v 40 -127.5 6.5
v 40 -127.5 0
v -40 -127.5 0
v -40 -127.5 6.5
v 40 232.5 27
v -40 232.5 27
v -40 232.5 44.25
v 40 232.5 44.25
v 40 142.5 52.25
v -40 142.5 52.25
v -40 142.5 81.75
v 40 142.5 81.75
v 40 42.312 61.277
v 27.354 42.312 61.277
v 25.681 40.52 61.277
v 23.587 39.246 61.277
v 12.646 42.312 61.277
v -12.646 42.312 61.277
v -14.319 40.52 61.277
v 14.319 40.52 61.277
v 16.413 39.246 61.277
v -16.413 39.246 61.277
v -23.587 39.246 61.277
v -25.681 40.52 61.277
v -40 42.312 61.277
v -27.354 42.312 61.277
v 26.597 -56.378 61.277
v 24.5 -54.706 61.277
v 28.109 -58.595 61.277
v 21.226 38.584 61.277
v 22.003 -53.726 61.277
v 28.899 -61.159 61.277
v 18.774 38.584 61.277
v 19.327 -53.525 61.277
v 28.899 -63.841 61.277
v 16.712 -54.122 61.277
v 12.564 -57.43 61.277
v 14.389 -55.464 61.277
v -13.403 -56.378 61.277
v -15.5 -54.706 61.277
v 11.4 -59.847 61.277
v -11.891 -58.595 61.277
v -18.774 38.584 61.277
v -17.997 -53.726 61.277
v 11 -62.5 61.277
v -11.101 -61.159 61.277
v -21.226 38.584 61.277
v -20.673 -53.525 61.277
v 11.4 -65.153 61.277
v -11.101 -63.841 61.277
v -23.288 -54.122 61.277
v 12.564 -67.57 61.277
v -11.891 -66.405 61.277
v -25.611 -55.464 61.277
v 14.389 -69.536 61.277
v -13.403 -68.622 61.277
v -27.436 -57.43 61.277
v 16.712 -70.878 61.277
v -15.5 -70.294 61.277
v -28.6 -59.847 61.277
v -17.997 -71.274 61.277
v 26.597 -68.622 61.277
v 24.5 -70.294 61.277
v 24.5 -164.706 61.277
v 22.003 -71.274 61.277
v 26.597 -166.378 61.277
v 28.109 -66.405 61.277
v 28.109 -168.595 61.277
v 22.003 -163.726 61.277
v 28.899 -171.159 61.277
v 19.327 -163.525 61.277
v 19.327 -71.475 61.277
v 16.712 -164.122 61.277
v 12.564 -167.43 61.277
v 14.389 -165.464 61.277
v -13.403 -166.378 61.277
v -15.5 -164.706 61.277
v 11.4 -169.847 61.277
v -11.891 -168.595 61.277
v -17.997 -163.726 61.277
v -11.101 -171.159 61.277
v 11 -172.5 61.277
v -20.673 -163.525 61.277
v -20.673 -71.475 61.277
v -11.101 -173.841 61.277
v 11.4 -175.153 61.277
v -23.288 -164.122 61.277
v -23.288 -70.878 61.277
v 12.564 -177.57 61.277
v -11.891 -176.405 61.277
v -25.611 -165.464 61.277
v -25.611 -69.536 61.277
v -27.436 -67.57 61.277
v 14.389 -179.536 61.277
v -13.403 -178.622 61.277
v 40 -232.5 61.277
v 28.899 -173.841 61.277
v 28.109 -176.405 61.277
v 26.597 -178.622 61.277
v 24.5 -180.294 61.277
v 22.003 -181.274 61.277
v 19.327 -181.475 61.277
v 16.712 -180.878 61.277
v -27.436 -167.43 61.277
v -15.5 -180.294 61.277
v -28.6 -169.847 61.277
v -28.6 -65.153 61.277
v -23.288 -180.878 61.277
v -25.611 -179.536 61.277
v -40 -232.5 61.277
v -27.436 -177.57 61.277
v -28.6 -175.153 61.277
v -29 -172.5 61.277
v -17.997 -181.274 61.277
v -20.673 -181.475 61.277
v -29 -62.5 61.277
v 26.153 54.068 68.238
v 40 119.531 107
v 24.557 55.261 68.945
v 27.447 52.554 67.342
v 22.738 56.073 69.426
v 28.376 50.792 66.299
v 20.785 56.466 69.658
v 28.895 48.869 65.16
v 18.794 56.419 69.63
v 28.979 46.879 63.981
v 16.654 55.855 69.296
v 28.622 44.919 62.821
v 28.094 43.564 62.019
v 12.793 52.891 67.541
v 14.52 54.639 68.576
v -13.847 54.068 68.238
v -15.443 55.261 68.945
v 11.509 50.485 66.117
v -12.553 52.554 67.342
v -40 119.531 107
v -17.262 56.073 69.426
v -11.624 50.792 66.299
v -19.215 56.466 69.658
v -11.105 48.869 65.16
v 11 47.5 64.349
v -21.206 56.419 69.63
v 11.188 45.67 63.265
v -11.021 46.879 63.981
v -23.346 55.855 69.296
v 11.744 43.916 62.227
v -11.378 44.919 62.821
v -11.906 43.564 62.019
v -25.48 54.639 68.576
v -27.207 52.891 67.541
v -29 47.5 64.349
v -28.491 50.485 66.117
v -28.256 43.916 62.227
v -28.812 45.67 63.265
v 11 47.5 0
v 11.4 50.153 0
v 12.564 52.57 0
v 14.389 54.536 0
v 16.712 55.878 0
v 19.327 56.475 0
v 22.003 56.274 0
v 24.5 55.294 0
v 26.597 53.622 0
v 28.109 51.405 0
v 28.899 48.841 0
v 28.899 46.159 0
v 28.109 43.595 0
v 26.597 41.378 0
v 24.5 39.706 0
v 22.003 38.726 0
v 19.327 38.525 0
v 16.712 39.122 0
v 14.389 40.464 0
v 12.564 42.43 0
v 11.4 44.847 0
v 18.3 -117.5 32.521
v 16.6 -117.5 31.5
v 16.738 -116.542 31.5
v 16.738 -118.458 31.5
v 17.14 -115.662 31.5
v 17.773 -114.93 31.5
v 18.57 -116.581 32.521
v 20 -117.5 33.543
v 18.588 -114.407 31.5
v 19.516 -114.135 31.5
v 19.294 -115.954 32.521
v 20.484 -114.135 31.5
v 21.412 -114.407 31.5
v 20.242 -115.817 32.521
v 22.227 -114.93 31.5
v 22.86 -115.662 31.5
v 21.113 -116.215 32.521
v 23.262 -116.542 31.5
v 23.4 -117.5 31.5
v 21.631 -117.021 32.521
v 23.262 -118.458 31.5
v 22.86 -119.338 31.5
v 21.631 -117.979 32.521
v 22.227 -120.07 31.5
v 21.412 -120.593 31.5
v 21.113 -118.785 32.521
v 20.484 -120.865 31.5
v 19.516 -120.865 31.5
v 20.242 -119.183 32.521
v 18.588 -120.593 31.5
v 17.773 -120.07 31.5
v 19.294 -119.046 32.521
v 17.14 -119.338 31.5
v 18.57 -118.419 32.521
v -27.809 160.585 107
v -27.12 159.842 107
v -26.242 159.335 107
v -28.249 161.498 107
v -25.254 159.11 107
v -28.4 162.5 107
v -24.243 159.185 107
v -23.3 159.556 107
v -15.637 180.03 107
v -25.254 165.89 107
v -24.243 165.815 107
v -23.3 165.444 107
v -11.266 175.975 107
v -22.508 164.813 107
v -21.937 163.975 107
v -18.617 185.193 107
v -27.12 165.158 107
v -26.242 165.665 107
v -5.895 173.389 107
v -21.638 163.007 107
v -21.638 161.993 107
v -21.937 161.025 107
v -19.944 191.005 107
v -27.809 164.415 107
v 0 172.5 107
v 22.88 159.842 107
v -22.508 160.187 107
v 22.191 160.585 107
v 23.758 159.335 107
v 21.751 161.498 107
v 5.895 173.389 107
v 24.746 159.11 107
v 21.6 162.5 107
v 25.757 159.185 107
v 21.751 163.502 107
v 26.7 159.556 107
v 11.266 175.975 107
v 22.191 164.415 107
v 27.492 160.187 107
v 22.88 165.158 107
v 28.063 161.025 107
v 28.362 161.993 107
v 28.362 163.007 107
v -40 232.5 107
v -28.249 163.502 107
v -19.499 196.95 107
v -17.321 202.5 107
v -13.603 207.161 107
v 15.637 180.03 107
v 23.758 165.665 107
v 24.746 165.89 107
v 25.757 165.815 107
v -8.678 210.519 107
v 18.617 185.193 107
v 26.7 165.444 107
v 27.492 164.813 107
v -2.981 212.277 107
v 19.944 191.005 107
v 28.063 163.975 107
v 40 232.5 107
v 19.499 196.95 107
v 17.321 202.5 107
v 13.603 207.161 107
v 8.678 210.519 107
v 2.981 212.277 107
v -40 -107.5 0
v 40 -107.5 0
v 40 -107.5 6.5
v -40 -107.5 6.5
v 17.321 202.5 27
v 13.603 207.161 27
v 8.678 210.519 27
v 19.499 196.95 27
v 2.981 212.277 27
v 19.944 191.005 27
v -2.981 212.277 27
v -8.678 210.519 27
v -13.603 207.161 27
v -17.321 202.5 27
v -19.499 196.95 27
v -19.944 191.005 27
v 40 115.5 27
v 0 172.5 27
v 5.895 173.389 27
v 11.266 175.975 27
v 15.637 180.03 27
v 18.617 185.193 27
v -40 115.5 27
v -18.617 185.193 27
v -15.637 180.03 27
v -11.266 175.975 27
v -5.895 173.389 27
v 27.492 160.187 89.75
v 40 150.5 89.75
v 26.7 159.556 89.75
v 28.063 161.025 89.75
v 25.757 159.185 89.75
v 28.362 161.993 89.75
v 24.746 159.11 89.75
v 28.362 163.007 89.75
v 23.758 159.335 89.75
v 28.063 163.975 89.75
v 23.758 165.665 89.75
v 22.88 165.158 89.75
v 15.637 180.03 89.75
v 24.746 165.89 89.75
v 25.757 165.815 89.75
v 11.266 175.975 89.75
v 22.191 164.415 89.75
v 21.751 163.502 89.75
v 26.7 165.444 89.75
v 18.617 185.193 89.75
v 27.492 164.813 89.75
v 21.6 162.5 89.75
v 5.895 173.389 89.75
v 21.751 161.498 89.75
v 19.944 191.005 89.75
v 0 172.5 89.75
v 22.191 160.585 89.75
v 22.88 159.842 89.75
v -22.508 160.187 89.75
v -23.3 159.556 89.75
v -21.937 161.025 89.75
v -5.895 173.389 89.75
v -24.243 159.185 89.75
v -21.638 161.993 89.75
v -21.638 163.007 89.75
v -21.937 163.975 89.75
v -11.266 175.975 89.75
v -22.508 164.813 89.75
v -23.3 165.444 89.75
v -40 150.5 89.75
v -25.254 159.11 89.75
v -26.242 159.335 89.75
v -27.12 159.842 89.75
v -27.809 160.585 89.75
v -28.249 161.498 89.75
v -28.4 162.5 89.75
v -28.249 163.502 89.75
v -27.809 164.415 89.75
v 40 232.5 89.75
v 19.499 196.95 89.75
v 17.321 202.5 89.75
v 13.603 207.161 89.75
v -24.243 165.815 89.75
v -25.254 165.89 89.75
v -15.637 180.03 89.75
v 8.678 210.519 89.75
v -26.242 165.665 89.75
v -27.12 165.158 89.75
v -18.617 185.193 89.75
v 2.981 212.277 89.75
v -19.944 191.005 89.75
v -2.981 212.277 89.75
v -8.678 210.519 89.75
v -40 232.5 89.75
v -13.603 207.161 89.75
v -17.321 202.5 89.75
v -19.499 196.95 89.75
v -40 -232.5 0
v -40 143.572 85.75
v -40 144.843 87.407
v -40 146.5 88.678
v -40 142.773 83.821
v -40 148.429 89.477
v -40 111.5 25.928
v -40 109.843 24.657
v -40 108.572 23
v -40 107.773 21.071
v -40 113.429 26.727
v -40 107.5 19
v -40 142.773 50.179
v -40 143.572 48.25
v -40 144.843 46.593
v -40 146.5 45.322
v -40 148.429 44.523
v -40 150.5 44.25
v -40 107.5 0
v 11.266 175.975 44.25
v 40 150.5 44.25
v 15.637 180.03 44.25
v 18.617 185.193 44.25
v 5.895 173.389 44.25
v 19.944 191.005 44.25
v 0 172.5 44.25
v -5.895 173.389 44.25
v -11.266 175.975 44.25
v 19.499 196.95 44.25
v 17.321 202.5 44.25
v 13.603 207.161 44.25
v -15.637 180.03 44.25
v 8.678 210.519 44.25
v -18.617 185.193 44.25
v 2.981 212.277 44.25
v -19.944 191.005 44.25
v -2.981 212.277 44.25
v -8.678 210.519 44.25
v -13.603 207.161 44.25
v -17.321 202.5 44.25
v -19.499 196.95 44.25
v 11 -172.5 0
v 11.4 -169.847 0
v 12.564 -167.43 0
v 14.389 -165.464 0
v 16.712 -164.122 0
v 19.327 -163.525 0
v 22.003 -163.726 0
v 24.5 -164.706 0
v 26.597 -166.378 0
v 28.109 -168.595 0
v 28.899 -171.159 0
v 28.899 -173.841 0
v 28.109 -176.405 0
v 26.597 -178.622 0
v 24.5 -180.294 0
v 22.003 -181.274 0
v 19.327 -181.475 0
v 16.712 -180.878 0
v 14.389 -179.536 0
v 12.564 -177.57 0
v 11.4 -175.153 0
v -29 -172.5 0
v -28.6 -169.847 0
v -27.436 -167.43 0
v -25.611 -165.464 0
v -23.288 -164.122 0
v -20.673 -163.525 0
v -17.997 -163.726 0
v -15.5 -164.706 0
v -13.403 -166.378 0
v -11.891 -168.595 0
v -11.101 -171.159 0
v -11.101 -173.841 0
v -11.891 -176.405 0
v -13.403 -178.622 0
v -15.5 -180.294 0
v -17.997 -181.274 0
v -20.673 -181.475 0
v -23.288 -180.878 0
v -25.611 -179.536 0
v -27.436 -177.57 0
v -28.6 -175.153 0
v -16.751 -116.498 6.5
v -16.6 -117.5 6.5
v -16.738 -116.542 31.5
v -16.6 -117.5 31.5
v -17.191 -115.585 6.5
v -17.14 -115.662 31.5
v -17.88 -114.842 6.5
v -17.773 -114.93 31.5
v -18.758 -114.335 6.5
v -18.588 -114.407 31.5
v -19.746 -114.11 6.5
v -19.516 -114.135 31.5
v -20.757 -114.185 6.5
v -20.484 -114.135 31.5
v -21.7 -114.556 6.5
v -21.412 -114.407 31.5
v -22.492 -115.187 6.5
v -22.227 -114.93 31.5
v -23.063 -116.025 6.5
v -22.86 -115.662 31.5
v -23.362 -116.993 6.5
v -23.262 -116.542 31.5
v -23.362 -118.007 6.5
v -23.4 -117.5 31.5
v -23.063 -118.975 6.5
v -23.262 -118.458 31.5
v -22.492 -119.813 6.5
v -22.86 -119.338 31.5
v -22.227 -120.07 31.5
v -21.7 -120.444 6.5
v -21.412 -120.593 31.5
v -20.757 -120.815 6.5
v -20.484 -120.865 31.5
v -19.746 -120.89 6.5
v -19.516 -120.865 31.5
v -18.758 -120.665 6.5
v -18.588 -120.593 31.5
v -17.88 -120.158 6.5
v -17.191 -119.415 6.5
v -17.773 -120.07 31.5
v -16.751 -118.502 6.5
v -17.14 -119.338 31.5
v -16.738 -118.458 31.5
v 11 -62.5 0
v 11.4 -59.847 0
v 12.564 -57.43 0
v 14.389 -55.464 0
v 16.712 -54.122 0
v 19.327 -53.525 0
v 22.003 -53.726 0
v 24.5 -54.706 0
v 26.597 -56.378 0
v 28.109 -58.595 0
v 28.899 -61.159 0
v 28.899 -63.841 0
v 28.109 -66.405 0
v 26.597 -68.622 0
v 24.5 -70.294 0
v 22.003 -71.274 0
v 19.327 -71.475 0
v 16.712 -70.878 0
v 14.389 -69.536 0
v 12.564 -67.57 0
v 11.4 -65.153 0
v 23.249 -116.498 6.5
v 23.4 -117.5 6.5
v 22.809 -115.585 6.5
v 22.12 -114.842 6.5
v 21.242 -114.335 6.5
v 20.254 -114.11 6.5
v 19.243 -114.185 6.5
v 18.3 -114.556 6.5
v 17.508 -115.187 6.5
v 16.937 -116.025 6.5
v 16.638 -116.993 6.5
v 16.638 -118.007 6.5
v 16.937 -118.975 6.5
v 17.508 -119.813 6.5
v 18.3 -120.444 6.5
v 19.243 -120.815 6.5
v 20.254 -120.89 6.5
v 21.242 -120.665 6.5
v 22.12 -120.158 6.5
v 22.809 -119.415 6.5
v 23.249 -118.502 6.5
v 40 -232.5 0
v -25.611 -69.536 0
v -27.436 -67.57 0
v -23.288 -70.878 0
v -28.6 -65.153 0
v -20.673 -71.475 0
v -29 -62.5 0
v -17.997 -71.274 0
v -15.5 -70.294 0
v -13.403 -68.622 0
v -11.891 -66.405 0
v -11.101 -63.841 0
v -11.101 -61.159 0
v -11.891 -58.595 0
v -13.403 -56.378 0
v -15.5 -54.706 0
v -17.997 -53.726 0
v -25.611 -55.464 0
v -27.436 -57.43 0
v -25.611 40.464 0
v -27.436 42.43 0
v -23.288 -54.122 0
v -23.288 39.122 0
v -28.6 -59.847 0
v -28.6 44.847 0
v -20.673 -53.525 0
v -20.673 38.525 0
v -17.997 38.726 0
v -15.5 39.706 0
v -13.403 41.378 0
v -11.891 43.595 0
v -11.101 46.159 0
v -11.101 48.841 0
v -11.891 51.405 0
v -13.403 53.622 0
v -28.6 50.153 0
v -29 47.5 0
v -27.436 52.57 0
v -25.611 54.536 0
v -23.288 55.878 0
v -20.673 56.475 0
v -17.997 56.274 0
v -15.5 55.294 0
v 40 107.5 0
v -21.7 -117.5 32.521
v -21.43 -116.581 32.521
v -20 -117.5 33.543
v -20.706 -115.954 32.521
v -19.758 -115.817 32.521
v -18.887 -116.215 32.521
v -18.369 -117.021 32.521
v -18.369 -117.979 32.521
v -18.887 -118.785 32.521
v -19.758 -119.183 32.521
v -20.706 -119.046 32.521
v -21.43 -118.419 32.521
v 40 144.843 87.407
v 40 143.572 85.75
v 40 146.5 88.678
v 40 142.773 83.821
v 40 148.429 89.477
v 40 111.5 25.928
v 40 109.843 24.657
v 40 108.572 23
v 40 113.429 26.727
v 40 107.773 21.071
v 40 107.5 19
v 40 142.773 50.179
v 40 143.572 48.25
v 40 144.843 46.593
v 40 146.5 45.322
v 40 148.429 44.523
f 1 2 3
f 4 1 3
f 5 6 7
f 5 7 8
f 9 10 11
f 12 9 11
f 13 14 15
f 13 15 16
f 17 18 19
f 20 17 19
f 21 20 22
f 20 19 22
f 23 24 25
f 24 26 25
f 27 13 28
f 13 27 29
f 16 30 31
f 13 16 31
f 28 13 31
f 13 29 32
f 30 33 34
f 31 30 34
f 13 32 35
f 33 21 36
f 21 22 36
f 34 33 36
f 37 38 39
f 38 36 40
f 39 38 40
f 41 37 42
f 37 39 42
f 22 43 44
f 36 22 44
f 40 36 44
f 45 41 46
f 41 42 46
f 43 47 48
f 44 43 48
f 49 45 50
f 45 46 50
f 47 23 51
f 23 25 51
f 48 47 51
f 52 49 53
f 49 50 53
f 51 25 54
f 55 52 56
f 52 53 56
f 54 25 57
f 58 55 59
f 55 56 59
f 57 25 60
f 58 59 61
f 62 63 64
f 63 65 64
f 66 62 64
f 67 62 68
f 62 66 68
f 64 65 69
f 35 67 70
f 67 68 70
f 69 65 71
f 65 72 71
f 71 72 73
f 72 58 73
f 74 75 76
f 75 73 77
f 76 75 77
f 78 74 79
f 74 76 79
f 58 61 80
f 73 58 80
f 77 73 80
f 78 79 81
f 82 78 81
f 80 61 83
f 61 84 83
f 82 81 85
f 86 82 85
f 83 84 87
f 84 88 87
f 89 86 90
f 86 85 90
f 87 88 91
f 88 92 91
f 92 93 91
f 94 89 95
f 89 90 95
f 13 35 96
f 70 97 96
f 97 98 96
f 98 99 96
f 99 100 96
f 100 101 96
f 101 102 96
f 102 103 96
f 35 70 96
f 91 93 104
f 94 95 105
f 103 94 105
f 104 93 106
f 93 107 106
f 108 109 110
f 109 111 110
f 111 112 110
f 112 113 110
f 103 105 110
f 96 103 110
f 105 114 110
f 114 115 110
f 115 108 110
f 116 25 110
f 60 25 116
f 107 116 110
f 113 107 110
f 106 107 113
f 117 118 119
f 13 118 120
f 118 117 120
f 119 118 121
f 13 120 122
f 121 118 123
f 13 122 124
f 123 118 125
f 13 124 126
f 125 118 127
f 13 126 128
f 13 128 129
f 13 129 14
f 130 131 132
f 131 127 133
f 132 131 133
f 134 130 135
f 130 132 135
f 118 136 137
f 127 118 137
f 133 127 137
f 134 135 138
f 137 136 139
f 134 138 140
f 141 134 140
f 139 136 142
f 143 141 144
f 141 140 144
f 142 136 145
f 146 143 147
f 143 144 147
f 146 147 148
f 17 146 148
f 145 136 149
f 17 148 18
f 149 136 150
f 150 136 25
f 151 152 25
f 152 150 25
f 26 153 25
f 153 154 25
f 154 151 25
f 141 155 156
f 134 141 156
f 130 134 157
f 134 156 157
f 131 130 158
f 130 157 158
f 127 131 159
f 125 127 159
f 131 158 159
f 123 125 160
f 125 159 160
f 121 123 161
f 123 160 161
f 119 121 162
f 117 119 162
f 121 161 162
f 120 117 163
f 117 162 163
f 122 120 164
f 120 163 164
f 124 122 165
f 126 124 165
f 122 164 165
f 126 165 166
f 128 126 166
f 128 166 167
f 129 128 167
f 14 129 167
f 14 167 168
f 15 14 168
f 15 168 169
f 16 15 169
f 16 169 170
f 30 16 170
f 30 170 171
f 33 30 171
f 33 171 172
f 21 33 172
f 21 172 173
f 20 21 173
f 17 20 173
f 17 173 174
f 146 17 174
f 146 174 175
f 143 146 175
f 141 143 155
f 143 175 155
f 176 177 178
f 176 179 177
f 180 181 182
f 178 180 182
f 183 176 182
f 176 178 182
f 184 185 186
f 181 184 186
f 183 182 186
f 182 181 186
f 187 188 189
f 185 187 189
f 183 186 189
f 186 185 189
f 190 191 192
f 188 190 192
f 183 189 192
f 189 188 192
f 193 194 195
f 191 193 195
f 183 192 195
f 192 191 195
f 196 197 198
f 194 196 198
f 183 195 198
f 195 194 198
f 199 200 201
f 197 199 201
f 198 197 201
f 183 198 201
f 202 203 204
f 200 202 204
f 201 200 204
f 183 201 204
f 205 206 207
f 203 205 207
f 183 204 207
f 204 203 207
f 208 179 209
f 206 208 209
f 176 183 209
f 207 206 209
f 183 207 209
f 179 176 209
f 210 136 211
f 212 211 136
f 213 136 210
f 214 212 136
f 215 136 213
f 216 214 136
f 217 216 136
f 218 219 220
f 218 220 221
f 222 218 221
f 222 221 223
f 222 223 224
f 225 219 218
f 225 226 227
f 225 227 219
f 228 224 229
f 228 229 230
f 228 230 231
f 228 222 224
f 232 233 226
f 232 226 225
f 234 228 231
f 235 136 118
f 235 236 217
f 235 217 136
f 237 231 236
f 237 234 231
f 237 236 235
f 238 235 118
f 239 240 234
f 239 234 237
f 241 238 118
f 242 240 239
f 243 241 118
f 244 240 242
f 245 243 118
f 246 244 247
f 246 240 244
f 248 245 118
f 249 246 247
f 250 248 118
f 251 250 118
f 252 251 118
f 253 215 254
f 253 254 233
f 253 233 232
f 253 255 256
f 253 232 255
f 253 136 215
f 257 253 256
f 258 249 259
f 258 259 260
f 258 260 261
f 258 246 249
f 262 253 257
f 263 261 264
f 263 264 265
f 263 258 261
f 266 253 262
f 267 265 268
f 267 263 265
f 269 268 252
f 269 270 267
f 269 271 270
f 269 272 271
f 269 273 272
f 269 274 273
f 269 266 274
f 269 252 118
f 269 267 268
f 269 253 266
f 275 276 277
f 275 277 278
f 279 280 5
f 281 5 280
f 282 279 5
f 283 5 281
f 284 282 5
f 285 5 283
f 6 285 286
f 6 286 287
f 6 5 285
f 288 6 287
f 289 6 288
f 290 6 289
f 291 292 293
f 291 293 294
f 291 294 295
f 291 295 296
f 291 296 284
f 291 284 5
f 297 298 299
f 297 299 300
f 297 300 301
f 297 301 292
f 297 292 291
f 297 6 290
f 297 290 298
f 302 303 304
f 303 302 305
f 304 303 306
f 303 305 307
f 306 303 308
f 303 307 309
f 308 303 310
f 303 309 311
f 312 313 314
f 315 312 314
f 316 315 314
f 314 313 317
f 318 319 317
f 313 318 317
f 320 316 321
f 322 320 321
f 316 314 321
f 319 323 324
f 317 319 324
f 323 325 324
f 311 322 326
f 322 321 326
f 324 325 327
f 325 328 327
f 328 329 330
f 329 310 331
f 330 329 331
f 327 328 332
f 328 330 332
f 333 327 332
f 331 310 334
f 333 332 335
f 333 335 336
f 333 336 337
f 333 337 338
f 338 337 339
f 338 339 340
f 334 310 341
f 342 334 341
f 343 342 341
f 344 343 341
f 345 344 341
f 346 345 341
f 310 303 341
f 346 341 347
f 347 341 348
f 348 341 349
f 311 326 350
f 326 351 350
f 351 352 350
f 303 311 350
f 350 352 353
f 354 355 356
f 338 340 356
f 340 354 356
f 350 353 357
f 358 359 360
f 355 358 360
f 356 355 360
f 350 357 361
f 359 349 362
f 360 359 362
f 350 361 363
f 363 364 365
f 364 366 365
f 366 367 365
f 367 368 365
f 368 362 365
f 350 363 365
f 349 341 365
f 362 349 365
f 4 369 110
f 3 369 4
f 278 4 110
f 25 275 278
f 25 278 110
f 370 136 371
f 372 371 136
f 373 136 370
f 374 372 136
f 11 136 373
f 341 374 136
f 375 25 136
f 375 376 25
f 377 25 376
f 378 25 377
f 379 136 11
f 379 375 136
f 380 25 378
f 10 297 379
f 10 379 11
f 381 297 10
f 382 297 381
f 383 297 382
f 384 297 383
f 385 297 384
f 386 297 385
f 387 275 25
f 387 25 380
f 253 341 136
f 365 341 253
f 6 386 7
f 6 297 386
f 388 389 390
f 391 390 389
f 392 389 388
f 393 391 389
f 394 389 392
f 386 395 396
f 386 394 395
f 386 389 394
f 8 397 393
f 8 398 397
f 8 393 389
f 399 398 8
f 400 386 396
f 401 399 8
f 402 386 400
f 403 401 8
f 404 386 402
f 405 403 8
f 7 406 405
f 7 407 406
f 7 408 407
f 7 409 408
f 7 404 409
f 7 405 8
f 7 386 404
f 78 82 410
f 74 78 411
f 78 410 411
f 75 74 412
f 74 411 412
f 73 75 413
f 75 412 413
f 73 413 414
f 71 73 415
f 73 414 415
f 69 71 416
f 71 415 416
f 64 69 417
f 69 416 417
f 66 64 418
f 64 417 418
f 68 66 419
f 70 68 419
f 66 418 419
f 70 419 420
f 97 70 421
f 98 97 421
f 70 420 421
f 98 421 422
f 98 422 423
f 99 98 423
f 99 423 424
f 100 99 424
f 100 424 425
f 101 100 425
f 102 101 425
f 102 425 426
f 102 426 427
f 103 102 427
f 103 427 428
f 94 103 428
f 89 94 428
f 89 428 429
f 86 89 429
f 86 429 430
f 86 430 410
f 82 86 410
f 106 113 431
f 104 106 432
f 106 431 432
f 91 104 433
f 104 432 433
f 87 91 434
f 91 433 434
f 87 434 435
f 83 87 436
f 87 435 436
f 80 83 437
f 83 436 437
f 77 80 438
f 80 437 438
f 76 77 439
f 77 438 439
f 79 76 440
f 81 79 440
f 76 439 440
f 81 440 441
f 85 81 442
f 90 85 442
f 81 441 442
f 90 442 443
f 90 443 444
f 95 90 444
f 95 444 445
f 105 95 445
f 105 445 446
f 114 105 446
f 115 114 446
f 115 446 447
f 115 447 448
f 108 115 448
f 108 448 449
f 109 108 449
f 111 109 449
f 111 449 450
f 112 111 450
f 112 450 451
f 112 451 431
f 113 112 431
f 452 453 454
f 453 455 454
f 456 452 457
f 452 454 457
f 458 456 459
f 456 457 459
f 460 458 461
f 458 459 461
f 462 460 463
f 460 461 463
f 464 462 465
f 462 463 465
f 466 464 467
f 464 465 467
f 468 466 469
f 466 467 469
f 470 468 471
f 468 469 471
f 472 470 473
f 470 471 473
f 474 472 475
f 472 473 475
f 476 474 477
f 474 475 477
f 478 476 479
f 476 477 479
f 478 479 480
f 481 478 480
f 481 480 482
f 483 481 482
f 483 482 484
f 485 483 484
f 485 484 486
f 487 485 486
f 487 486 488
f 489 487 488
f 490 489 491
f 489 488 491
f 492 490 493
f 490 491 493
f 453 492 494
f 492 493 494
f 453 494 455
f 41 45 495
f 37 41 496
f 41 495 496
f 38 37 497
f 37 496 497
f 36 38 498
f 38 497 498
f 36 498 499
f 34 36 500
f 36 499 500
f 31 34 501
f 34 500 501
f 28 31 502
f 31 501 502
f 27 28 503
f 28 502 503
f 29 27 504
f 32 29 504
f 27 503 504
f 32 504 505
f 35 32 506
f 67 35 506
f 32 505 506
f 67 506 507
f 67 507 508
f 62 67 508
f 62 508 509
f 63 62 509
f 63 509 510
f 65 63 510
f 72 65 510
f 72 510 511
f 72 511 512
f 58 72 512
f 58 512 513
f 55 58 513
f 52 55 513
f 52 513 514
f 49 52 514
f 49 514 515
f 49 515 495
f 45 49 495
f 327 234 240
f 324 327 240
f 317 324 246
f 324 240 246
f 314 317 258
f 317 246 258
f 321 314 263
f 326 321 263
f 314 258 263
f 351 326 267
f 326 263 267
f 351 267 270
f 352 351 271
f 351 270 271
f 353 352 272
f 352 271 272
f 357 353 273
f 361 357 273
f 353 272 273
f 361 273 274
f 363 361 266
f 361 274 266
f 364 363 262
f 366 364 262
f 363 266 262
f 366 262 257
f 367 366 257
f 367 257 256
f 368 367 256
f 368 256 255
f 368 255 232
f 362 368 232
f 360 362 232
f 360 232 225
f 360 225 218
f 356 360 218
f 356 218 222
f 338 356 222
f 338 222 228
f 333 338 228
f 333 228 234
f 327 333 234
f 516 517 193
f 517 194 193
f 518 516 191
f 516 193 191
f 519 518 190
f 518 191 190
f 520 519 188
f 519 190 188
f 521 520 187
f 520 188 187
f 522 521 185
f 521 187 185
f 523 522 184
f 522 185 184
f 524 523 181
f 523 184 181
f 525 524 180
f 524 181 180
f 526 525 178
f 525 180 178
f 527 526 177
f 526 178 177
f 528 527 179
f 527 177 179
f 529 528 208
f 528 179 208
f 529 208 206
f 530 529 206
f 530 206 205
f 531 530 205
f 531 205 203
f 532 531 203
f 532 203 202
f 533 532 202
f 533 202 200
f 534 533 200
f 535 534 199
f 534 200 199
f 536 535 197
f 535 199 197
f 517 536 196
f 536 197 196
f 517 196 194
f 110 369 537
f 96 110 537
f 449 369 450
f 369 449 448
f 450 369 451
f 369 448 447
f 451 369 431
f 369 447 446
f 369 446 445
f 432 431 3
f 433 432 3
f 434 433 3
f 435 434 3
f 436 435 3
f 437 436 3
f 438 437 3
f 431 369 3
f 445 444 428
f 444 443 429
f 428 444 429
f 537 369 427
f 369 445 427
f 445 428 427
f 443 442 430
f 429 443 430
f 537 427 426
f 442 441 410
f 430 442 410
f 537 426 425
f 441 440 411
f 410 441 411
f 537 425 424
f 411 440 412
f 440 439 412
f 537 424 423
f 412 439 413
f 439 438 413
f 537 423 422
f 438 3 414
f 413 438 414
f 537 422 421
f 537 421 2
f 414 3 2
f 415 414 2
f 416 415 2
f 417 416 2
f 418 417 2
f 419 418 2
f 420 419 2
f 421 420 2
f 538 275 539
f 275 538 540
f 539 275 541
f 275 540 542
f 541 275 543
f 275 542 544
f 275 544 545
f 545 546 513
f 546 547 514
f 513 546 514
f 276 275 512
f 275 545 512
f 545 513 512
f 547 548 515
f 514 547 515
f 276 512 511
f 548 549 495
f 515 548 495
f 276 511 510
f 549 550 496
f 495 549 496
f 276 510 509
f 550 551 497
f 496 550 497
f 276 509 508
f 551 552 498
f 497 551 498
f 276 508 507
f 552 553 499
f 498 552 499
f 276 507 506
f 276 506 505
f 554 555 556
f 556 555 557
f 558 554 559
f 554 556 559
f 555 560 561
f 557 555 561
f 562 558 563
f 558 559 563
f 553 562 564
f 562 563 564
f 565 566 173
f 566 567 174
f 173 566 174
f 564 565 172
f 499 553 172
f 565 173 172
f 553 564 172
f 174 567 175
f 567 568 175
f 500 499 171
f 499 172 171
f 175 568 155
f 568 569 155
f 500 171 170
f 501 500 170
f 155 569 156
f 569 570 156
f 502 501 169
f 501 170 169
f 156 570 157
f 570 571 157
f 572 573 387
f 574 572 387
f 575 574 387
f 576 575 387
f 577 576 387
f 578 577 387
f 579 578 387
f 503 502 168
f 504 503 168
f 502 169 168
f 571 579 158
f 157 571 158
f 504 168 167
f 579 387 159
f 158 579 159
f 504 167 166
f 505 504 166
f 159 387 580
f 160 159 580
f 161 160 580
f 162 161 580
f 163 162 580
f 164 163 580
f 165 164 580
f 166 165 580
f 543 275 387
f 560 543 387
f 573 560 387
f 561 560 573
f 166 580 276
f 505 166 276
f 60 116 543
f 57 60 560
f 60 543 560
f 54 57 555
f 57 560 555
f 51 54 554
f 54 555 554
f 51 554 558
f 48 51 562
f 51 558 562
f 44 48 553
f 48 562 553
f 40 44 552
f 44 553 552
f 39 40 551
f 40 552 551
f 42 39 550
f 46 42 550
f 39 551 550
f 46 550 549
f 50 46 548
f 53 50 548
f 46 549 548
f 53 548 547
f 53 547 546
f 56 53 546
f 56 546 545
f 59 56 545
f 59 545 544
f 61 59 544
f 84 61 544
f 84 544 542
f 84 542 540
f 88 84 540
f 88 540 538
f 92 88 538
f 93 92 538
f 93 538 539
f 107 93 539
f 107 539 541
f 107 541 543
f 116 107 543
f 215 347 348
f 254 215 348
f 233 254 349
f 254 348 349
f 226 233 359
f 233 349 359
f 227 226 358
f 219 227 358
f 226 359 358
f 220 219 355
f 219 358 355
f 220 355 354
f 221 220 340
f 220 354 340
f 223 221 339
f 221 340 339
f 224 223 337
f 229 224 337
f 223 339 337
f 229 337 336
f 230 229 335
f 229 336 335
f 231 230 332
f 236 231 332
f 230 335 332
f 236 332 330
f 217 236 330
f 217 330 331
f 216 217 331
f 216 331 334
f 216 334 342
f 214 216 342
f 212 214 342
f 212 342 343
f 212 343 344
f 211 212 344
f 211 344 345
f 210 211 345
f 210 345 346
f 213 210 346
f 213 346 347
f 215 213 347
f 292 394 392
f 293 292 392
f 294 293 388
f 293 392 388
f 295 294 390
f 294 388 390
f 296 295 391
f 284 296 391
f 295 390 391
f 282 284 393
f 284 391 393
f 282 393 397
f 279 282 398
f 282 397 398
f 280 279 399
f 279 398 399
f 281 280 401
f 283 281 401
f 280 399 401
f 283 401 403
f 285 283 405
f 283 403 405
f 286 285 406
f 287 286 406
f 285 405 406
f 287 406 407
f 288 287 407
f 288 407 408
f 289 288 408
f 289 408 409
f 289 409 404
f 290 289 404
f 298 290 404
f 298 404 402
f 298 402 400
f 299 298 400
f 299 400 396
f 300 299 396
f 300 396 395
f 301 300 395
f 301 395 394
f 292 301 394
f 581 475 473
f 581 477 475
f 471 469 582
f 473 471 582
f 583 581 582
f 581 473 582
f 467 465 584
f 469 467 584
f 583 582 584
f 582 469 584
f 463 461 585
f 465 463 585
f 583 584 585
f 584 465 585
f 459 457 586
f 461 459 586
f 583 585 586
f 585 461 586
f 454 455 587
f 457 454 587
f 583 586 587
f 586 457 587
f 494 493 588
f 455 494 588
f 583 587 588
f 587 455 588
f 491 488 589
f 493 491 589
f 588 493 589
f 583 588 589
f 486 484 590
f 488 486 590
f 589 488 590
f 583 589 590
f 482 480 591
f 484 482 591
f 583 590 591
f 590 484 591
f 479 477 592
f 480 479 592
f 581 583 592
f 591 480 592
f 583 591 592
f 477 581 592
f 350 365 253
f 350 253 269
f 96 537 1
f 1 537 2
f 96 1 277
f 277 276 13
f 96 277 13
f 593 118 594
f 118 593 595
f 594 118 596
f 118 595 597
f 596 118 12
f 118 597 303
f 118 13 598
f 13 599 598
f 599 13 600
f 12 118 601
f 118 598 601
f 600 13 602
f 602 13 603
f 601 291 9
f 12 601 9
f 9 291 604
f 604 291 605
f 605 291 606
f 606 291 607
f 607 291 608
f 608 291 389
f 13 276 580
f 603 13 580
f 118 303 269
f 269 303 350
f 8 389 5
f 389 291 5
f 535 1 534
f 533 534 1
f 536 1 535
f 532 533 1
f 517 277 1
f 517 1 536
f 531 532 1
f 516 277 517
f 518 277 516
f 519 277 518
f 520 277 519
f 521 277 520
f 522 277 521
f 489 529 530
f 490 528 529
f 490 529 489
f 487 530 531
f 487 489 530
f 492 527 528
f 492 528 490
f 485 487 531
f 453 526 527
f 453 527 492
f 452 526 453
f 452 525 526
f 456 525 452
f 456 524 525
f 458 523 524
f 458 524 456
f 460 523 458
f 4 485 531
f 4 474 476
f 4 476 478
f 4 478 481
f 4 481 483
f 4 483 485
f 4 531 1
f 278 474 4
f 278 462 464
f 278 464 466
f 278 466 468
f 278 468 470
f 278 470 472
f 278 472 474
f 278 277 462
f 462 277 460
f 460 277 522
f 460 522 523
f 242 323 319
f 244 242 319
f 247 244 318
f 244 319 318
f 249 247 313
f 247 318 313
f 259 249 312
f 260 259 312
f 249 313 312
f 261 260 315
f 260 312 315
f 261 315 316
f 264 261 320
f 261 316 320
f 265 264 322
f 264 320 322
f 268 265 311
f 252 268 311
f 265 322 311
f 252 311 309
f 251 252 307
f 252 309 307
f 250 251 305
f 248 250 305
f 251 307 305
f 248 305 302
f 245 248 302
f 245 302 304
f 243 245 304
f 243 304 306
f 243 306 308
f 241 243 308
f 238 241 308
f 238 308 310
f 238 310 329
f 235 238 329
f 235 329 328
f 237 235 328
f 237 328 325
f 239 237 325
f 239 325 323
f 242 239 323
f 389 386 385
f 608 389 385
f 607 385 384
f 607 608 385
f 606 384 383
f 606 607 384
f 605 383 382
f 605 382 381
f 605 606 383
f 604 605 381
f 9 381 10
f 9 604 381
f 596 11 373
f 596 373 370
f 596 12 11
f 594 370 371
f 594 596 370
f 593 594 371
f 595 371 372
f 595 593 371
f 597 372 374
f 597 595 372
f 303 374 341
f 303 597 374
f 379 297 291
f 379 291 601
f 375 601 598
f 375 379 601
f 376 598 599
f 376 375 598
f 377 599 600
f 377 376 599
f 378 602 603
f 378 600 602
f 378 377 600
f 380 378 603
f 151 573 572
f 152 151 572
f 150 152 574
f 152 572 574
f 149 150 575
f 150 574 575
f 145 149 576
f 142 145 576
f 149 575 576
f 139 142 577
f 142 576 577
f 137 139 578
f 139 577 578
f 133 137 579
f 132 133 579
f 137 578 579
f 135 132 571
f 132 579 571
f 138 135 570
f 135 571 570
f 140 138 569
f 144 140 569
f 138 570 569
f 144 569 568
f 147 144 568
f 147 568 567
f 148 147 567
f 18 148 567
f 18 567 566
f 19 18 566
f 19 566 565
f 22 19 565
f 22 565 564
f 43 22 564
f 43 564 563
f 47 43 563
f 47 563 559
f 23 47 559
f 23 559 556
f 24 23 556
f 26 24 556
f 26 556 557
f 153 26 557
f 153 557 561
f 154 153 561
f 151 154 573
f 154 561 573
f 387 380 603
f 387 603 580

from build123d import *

# Parameters (mm, degrees)
SKETCH_1_W                  = 80
SKETCH_1_H                  = 465
EXTRUDE_1_DEPTH             = 107
CUT_EXTRUDE_1_REACH         = 270.152
SKETCH_2_W                  = 45.5
SKETCH_2_H                  = 90
CUT_EXTRUDE_2_REACH         = 270.152
CUT_EXTRUDE_3_REACH         = 261.047
SKETCH_4_R                  = 20
HOLE_WIZARD_M8_1_D          = 6.8
HOLE_WIZARD_M8_1_DEPTH      = 17.25
CUT_EXTRUDE_4_REACH         = 261.047
SKETCH_8_R                  = 9
PATTERN_LINEAR_1_COUNT      = 2
PATTERN_LINEAR_1_PITCH      = 40
PATTERN_LINEAR_1_COUNT_DIR2 = 3
PATTERN_LINEAR_1_PITCH_DIR2 = 110
SKETCH_9_W                  = 80
SKETCH_9_H                  = 20
CUT_EXTRUDE_5_DEPTH         = 6.5
HOLE_WIZARD_M8_2_D          = 6.8
HOLE_WIZARD_M8_2_DEPTH      = 25
HOLE_WIZARD_M8_2_TIP        = 2.042926105
FILLET_1_R                  = 8


with BuildPart() as part:
    # 草图1 → 凸台-拉伸1 (new body)
    with BuildSketch(Plane.XY):
        Rectangle(SKETCH_1_W, SKETCH_1_H)
    extrude(amount=EXTRUDE_1_DEPTH)

    # 草图2 → 切除-拉伸1 (cut, up to next)
    with BuildSketch(Plane.ZY.offset(40), mode=Mode.PRIVATE) as cut_extrude_1_sk1:
        with BuildLine():
            Line((27, 232.5), (27, 115.5))
            ThreePointArc((27, 115.5), (24.656854249, 109.843145751), (19, 107.5))
            Line((19, 107.5), (0, 107.5))
            Line((0, 107.5), (0, 232.5))
            Line((0, 232.5), (27, 232.5))
        make_face()
    cut_extrude_1_tool1 = extrude(cut_extrude_1_sk1.sketch, amount=-CUT_EXTRUDE_1_REACH, mode=Mode.PRIVATE) & part.part
    # 草图2 → 切除-拉伸1 (cut, up to next)
    with BuildSketch(Plane.ZY.offset(40), mode=Mode.PRIVATE) as cut_extrude_1_sk2:
        with Locations((67, 187.5)):
            Rectangle(SKETCH_2_W, SKETCH_2_H)
    cut_extrude_1_tool2 = extrude(cut_extrude_1_sk2.sketch, amount=-CUT_EXTRUDE_1_REACH, mode=Mode.PRIVATE) & part.part
    add(cut_extrude_1_tool1.solids().sort_by_distance((-40, 170.248081, 13.452139))[0], mode=Mode.SUBTRACT)
    add(cut_extrude_1_tool2.solids().sort_by_distance((-40, 187.5, 67))[0], mode=Mode.SUBTRACT)

    # 草图3 → 切除-拉伸2 (cut, up to next)
    with BuildSketch(Plane.ZY.offset(40), mode=Mode.PRIVATE) as cut_extrude_2_sk1:
        Polygon((107, 119.530661885), (61.277191914, 42.311924553), (61.277191914, -232.5), (107, -232.5), align=None)
    cut_extrude_2_tool1 = extrude(cut_extrude_2_sk1.sketch, amount=-CUT_EXTRUDE_2_REACH, mode=Mode.PRIVATE) & part.part
    add(cut_extrude_2_tool1.solids().sort_by_distance((-40, -74.996659, 85.077337))[0], mode=Mode.SUBTRACT)

    # 切除-拉伸3: up to this face of the body (flat: up to its plane)
    cut_extrude_3_end = Plane(part.part.faces().sort_by_distance((0, 174, 27))[0])
    # 草图4 → 切除-拉伸3 (cut, up to the picked face)
    with BuildSketch(Plane.XY.offset(107), mode=Mode.PRIVATE) as cut_extrude_3_sk1:
        with Locations(Location((0, 192.5, 0), (0, 0, 270))):
            Circle(SKETCH_4_R)
    cut_extrude_3_tool1 = split(extrude(cut_extrude_3_sk1.sketch, amount=-CUT_EXTRUDE_3_REACH, mode=Mode.PRIVATE), bisect_by=cut_extrude_3_end, keep=Keep.BOTH, mode=Mode.PRIVATE)
    add(cut_extrude_3_tool1.solids().sort_by(Axis((0, 192.5, 107), (0, 0, -1)))[0], mode=Mode.SUBTRACT)

    # M8 螺纹孔1
    with Locations(Plane.XY.offset(107)):
        with Locations((-25, 162.5), (25, 162.5)):
            Hole(HOLE_WIZARD_M8_1_D / 2, depth=HOLE_WIZARD_M8_1_DEPTH)

    # 草图8 → 切除-拉伸4 (cut, up to next)
    with BuildSketch(Plane(origin=(0, 0, 0), x_dir=(-1, 0, 0), z_dir=(0, 0, -1)), mode=Mode.PRIVATE) as cut_extrude_4_sk1:
        with Locations((-20, 47.5)):
            Circle(SKETCH_8_R)
    cut_extrude_4_tool1 = extrude(cut_extrude_4_sk1.sketch, amount=-CUT_EXTRUDE_4_REACH, mode=Mode.PRIVATE) & part.part
    cut_extrude_4 = cut_extrude_4_tool1.solids().sort_by_distance((20, 47.5, 0))[0]
    add(cut_extrude_4, mode=Mode.SUBTRACT)

    # 阵列(线性)1: Cut-Extrude 4 2 × 3
    with Locations(*[(-i * PATTERN_LINEAR_1_PITCH, -j * PATTERN_LINEAR_1_PITCH_DIR2, 0) for i in range(PATTERN_LINEAR_1_COUNT) for j in range(PATTERN_LINEAR_1_COUNT_DIR2) if (i, j) != (0, 0)]):
        add(cut_extrude_4, mode=Mode.SUBTRACT)

    # 草图9 → 切除-拉伸5 (cut)
    with BuildSketch(Plane(origin=(0, 0, 0), x_dir=(-1, 0, 0), z_dir=(0, 0, -1))):
        with Locations((0, -117.5)):
            Rectangle(SKETCH_9_W, SKETCH_9_H)
    extrude(amount=-CUT_EXTRUDE_5_DEPTH, mode=Mode.SUBTRACT)

    # M8 螺纹孔2
    with Locations(Plane(origin=(0, 0, 6.5), x_dir=(-1, 0, 0), z_dir=(0, 0, -1))):
        with Locations((-20, -117.5), (20, -117.5)):
            Hole(HOLE_WIZARD_M8_2_D / 2, depth=HOLE_WIZARD_M8_2_DEPTH)
            with Locations((0, 0, -(HOLE_WIZARD_M8_2_DEPTH + HOLE_WIZARD_M8_2_TIP / 2))):  # 118° drill point
                Cone(0, HOLE_WIZARD_M8_2_D / 2, HOLE_WIZARD_M8_2_TIP, mode=Mode.SUBTRACT)

    # 圆角1
    fillet_1_edges = [part.edges().sort_by_distance(p)[0] for p in [
        (0, 142.5, 89.75),
        (0, 142.5, 44.25),
    ]]
    fillet(fillet_1_edges, radius=FILLET_1_R)


solid = part.part
